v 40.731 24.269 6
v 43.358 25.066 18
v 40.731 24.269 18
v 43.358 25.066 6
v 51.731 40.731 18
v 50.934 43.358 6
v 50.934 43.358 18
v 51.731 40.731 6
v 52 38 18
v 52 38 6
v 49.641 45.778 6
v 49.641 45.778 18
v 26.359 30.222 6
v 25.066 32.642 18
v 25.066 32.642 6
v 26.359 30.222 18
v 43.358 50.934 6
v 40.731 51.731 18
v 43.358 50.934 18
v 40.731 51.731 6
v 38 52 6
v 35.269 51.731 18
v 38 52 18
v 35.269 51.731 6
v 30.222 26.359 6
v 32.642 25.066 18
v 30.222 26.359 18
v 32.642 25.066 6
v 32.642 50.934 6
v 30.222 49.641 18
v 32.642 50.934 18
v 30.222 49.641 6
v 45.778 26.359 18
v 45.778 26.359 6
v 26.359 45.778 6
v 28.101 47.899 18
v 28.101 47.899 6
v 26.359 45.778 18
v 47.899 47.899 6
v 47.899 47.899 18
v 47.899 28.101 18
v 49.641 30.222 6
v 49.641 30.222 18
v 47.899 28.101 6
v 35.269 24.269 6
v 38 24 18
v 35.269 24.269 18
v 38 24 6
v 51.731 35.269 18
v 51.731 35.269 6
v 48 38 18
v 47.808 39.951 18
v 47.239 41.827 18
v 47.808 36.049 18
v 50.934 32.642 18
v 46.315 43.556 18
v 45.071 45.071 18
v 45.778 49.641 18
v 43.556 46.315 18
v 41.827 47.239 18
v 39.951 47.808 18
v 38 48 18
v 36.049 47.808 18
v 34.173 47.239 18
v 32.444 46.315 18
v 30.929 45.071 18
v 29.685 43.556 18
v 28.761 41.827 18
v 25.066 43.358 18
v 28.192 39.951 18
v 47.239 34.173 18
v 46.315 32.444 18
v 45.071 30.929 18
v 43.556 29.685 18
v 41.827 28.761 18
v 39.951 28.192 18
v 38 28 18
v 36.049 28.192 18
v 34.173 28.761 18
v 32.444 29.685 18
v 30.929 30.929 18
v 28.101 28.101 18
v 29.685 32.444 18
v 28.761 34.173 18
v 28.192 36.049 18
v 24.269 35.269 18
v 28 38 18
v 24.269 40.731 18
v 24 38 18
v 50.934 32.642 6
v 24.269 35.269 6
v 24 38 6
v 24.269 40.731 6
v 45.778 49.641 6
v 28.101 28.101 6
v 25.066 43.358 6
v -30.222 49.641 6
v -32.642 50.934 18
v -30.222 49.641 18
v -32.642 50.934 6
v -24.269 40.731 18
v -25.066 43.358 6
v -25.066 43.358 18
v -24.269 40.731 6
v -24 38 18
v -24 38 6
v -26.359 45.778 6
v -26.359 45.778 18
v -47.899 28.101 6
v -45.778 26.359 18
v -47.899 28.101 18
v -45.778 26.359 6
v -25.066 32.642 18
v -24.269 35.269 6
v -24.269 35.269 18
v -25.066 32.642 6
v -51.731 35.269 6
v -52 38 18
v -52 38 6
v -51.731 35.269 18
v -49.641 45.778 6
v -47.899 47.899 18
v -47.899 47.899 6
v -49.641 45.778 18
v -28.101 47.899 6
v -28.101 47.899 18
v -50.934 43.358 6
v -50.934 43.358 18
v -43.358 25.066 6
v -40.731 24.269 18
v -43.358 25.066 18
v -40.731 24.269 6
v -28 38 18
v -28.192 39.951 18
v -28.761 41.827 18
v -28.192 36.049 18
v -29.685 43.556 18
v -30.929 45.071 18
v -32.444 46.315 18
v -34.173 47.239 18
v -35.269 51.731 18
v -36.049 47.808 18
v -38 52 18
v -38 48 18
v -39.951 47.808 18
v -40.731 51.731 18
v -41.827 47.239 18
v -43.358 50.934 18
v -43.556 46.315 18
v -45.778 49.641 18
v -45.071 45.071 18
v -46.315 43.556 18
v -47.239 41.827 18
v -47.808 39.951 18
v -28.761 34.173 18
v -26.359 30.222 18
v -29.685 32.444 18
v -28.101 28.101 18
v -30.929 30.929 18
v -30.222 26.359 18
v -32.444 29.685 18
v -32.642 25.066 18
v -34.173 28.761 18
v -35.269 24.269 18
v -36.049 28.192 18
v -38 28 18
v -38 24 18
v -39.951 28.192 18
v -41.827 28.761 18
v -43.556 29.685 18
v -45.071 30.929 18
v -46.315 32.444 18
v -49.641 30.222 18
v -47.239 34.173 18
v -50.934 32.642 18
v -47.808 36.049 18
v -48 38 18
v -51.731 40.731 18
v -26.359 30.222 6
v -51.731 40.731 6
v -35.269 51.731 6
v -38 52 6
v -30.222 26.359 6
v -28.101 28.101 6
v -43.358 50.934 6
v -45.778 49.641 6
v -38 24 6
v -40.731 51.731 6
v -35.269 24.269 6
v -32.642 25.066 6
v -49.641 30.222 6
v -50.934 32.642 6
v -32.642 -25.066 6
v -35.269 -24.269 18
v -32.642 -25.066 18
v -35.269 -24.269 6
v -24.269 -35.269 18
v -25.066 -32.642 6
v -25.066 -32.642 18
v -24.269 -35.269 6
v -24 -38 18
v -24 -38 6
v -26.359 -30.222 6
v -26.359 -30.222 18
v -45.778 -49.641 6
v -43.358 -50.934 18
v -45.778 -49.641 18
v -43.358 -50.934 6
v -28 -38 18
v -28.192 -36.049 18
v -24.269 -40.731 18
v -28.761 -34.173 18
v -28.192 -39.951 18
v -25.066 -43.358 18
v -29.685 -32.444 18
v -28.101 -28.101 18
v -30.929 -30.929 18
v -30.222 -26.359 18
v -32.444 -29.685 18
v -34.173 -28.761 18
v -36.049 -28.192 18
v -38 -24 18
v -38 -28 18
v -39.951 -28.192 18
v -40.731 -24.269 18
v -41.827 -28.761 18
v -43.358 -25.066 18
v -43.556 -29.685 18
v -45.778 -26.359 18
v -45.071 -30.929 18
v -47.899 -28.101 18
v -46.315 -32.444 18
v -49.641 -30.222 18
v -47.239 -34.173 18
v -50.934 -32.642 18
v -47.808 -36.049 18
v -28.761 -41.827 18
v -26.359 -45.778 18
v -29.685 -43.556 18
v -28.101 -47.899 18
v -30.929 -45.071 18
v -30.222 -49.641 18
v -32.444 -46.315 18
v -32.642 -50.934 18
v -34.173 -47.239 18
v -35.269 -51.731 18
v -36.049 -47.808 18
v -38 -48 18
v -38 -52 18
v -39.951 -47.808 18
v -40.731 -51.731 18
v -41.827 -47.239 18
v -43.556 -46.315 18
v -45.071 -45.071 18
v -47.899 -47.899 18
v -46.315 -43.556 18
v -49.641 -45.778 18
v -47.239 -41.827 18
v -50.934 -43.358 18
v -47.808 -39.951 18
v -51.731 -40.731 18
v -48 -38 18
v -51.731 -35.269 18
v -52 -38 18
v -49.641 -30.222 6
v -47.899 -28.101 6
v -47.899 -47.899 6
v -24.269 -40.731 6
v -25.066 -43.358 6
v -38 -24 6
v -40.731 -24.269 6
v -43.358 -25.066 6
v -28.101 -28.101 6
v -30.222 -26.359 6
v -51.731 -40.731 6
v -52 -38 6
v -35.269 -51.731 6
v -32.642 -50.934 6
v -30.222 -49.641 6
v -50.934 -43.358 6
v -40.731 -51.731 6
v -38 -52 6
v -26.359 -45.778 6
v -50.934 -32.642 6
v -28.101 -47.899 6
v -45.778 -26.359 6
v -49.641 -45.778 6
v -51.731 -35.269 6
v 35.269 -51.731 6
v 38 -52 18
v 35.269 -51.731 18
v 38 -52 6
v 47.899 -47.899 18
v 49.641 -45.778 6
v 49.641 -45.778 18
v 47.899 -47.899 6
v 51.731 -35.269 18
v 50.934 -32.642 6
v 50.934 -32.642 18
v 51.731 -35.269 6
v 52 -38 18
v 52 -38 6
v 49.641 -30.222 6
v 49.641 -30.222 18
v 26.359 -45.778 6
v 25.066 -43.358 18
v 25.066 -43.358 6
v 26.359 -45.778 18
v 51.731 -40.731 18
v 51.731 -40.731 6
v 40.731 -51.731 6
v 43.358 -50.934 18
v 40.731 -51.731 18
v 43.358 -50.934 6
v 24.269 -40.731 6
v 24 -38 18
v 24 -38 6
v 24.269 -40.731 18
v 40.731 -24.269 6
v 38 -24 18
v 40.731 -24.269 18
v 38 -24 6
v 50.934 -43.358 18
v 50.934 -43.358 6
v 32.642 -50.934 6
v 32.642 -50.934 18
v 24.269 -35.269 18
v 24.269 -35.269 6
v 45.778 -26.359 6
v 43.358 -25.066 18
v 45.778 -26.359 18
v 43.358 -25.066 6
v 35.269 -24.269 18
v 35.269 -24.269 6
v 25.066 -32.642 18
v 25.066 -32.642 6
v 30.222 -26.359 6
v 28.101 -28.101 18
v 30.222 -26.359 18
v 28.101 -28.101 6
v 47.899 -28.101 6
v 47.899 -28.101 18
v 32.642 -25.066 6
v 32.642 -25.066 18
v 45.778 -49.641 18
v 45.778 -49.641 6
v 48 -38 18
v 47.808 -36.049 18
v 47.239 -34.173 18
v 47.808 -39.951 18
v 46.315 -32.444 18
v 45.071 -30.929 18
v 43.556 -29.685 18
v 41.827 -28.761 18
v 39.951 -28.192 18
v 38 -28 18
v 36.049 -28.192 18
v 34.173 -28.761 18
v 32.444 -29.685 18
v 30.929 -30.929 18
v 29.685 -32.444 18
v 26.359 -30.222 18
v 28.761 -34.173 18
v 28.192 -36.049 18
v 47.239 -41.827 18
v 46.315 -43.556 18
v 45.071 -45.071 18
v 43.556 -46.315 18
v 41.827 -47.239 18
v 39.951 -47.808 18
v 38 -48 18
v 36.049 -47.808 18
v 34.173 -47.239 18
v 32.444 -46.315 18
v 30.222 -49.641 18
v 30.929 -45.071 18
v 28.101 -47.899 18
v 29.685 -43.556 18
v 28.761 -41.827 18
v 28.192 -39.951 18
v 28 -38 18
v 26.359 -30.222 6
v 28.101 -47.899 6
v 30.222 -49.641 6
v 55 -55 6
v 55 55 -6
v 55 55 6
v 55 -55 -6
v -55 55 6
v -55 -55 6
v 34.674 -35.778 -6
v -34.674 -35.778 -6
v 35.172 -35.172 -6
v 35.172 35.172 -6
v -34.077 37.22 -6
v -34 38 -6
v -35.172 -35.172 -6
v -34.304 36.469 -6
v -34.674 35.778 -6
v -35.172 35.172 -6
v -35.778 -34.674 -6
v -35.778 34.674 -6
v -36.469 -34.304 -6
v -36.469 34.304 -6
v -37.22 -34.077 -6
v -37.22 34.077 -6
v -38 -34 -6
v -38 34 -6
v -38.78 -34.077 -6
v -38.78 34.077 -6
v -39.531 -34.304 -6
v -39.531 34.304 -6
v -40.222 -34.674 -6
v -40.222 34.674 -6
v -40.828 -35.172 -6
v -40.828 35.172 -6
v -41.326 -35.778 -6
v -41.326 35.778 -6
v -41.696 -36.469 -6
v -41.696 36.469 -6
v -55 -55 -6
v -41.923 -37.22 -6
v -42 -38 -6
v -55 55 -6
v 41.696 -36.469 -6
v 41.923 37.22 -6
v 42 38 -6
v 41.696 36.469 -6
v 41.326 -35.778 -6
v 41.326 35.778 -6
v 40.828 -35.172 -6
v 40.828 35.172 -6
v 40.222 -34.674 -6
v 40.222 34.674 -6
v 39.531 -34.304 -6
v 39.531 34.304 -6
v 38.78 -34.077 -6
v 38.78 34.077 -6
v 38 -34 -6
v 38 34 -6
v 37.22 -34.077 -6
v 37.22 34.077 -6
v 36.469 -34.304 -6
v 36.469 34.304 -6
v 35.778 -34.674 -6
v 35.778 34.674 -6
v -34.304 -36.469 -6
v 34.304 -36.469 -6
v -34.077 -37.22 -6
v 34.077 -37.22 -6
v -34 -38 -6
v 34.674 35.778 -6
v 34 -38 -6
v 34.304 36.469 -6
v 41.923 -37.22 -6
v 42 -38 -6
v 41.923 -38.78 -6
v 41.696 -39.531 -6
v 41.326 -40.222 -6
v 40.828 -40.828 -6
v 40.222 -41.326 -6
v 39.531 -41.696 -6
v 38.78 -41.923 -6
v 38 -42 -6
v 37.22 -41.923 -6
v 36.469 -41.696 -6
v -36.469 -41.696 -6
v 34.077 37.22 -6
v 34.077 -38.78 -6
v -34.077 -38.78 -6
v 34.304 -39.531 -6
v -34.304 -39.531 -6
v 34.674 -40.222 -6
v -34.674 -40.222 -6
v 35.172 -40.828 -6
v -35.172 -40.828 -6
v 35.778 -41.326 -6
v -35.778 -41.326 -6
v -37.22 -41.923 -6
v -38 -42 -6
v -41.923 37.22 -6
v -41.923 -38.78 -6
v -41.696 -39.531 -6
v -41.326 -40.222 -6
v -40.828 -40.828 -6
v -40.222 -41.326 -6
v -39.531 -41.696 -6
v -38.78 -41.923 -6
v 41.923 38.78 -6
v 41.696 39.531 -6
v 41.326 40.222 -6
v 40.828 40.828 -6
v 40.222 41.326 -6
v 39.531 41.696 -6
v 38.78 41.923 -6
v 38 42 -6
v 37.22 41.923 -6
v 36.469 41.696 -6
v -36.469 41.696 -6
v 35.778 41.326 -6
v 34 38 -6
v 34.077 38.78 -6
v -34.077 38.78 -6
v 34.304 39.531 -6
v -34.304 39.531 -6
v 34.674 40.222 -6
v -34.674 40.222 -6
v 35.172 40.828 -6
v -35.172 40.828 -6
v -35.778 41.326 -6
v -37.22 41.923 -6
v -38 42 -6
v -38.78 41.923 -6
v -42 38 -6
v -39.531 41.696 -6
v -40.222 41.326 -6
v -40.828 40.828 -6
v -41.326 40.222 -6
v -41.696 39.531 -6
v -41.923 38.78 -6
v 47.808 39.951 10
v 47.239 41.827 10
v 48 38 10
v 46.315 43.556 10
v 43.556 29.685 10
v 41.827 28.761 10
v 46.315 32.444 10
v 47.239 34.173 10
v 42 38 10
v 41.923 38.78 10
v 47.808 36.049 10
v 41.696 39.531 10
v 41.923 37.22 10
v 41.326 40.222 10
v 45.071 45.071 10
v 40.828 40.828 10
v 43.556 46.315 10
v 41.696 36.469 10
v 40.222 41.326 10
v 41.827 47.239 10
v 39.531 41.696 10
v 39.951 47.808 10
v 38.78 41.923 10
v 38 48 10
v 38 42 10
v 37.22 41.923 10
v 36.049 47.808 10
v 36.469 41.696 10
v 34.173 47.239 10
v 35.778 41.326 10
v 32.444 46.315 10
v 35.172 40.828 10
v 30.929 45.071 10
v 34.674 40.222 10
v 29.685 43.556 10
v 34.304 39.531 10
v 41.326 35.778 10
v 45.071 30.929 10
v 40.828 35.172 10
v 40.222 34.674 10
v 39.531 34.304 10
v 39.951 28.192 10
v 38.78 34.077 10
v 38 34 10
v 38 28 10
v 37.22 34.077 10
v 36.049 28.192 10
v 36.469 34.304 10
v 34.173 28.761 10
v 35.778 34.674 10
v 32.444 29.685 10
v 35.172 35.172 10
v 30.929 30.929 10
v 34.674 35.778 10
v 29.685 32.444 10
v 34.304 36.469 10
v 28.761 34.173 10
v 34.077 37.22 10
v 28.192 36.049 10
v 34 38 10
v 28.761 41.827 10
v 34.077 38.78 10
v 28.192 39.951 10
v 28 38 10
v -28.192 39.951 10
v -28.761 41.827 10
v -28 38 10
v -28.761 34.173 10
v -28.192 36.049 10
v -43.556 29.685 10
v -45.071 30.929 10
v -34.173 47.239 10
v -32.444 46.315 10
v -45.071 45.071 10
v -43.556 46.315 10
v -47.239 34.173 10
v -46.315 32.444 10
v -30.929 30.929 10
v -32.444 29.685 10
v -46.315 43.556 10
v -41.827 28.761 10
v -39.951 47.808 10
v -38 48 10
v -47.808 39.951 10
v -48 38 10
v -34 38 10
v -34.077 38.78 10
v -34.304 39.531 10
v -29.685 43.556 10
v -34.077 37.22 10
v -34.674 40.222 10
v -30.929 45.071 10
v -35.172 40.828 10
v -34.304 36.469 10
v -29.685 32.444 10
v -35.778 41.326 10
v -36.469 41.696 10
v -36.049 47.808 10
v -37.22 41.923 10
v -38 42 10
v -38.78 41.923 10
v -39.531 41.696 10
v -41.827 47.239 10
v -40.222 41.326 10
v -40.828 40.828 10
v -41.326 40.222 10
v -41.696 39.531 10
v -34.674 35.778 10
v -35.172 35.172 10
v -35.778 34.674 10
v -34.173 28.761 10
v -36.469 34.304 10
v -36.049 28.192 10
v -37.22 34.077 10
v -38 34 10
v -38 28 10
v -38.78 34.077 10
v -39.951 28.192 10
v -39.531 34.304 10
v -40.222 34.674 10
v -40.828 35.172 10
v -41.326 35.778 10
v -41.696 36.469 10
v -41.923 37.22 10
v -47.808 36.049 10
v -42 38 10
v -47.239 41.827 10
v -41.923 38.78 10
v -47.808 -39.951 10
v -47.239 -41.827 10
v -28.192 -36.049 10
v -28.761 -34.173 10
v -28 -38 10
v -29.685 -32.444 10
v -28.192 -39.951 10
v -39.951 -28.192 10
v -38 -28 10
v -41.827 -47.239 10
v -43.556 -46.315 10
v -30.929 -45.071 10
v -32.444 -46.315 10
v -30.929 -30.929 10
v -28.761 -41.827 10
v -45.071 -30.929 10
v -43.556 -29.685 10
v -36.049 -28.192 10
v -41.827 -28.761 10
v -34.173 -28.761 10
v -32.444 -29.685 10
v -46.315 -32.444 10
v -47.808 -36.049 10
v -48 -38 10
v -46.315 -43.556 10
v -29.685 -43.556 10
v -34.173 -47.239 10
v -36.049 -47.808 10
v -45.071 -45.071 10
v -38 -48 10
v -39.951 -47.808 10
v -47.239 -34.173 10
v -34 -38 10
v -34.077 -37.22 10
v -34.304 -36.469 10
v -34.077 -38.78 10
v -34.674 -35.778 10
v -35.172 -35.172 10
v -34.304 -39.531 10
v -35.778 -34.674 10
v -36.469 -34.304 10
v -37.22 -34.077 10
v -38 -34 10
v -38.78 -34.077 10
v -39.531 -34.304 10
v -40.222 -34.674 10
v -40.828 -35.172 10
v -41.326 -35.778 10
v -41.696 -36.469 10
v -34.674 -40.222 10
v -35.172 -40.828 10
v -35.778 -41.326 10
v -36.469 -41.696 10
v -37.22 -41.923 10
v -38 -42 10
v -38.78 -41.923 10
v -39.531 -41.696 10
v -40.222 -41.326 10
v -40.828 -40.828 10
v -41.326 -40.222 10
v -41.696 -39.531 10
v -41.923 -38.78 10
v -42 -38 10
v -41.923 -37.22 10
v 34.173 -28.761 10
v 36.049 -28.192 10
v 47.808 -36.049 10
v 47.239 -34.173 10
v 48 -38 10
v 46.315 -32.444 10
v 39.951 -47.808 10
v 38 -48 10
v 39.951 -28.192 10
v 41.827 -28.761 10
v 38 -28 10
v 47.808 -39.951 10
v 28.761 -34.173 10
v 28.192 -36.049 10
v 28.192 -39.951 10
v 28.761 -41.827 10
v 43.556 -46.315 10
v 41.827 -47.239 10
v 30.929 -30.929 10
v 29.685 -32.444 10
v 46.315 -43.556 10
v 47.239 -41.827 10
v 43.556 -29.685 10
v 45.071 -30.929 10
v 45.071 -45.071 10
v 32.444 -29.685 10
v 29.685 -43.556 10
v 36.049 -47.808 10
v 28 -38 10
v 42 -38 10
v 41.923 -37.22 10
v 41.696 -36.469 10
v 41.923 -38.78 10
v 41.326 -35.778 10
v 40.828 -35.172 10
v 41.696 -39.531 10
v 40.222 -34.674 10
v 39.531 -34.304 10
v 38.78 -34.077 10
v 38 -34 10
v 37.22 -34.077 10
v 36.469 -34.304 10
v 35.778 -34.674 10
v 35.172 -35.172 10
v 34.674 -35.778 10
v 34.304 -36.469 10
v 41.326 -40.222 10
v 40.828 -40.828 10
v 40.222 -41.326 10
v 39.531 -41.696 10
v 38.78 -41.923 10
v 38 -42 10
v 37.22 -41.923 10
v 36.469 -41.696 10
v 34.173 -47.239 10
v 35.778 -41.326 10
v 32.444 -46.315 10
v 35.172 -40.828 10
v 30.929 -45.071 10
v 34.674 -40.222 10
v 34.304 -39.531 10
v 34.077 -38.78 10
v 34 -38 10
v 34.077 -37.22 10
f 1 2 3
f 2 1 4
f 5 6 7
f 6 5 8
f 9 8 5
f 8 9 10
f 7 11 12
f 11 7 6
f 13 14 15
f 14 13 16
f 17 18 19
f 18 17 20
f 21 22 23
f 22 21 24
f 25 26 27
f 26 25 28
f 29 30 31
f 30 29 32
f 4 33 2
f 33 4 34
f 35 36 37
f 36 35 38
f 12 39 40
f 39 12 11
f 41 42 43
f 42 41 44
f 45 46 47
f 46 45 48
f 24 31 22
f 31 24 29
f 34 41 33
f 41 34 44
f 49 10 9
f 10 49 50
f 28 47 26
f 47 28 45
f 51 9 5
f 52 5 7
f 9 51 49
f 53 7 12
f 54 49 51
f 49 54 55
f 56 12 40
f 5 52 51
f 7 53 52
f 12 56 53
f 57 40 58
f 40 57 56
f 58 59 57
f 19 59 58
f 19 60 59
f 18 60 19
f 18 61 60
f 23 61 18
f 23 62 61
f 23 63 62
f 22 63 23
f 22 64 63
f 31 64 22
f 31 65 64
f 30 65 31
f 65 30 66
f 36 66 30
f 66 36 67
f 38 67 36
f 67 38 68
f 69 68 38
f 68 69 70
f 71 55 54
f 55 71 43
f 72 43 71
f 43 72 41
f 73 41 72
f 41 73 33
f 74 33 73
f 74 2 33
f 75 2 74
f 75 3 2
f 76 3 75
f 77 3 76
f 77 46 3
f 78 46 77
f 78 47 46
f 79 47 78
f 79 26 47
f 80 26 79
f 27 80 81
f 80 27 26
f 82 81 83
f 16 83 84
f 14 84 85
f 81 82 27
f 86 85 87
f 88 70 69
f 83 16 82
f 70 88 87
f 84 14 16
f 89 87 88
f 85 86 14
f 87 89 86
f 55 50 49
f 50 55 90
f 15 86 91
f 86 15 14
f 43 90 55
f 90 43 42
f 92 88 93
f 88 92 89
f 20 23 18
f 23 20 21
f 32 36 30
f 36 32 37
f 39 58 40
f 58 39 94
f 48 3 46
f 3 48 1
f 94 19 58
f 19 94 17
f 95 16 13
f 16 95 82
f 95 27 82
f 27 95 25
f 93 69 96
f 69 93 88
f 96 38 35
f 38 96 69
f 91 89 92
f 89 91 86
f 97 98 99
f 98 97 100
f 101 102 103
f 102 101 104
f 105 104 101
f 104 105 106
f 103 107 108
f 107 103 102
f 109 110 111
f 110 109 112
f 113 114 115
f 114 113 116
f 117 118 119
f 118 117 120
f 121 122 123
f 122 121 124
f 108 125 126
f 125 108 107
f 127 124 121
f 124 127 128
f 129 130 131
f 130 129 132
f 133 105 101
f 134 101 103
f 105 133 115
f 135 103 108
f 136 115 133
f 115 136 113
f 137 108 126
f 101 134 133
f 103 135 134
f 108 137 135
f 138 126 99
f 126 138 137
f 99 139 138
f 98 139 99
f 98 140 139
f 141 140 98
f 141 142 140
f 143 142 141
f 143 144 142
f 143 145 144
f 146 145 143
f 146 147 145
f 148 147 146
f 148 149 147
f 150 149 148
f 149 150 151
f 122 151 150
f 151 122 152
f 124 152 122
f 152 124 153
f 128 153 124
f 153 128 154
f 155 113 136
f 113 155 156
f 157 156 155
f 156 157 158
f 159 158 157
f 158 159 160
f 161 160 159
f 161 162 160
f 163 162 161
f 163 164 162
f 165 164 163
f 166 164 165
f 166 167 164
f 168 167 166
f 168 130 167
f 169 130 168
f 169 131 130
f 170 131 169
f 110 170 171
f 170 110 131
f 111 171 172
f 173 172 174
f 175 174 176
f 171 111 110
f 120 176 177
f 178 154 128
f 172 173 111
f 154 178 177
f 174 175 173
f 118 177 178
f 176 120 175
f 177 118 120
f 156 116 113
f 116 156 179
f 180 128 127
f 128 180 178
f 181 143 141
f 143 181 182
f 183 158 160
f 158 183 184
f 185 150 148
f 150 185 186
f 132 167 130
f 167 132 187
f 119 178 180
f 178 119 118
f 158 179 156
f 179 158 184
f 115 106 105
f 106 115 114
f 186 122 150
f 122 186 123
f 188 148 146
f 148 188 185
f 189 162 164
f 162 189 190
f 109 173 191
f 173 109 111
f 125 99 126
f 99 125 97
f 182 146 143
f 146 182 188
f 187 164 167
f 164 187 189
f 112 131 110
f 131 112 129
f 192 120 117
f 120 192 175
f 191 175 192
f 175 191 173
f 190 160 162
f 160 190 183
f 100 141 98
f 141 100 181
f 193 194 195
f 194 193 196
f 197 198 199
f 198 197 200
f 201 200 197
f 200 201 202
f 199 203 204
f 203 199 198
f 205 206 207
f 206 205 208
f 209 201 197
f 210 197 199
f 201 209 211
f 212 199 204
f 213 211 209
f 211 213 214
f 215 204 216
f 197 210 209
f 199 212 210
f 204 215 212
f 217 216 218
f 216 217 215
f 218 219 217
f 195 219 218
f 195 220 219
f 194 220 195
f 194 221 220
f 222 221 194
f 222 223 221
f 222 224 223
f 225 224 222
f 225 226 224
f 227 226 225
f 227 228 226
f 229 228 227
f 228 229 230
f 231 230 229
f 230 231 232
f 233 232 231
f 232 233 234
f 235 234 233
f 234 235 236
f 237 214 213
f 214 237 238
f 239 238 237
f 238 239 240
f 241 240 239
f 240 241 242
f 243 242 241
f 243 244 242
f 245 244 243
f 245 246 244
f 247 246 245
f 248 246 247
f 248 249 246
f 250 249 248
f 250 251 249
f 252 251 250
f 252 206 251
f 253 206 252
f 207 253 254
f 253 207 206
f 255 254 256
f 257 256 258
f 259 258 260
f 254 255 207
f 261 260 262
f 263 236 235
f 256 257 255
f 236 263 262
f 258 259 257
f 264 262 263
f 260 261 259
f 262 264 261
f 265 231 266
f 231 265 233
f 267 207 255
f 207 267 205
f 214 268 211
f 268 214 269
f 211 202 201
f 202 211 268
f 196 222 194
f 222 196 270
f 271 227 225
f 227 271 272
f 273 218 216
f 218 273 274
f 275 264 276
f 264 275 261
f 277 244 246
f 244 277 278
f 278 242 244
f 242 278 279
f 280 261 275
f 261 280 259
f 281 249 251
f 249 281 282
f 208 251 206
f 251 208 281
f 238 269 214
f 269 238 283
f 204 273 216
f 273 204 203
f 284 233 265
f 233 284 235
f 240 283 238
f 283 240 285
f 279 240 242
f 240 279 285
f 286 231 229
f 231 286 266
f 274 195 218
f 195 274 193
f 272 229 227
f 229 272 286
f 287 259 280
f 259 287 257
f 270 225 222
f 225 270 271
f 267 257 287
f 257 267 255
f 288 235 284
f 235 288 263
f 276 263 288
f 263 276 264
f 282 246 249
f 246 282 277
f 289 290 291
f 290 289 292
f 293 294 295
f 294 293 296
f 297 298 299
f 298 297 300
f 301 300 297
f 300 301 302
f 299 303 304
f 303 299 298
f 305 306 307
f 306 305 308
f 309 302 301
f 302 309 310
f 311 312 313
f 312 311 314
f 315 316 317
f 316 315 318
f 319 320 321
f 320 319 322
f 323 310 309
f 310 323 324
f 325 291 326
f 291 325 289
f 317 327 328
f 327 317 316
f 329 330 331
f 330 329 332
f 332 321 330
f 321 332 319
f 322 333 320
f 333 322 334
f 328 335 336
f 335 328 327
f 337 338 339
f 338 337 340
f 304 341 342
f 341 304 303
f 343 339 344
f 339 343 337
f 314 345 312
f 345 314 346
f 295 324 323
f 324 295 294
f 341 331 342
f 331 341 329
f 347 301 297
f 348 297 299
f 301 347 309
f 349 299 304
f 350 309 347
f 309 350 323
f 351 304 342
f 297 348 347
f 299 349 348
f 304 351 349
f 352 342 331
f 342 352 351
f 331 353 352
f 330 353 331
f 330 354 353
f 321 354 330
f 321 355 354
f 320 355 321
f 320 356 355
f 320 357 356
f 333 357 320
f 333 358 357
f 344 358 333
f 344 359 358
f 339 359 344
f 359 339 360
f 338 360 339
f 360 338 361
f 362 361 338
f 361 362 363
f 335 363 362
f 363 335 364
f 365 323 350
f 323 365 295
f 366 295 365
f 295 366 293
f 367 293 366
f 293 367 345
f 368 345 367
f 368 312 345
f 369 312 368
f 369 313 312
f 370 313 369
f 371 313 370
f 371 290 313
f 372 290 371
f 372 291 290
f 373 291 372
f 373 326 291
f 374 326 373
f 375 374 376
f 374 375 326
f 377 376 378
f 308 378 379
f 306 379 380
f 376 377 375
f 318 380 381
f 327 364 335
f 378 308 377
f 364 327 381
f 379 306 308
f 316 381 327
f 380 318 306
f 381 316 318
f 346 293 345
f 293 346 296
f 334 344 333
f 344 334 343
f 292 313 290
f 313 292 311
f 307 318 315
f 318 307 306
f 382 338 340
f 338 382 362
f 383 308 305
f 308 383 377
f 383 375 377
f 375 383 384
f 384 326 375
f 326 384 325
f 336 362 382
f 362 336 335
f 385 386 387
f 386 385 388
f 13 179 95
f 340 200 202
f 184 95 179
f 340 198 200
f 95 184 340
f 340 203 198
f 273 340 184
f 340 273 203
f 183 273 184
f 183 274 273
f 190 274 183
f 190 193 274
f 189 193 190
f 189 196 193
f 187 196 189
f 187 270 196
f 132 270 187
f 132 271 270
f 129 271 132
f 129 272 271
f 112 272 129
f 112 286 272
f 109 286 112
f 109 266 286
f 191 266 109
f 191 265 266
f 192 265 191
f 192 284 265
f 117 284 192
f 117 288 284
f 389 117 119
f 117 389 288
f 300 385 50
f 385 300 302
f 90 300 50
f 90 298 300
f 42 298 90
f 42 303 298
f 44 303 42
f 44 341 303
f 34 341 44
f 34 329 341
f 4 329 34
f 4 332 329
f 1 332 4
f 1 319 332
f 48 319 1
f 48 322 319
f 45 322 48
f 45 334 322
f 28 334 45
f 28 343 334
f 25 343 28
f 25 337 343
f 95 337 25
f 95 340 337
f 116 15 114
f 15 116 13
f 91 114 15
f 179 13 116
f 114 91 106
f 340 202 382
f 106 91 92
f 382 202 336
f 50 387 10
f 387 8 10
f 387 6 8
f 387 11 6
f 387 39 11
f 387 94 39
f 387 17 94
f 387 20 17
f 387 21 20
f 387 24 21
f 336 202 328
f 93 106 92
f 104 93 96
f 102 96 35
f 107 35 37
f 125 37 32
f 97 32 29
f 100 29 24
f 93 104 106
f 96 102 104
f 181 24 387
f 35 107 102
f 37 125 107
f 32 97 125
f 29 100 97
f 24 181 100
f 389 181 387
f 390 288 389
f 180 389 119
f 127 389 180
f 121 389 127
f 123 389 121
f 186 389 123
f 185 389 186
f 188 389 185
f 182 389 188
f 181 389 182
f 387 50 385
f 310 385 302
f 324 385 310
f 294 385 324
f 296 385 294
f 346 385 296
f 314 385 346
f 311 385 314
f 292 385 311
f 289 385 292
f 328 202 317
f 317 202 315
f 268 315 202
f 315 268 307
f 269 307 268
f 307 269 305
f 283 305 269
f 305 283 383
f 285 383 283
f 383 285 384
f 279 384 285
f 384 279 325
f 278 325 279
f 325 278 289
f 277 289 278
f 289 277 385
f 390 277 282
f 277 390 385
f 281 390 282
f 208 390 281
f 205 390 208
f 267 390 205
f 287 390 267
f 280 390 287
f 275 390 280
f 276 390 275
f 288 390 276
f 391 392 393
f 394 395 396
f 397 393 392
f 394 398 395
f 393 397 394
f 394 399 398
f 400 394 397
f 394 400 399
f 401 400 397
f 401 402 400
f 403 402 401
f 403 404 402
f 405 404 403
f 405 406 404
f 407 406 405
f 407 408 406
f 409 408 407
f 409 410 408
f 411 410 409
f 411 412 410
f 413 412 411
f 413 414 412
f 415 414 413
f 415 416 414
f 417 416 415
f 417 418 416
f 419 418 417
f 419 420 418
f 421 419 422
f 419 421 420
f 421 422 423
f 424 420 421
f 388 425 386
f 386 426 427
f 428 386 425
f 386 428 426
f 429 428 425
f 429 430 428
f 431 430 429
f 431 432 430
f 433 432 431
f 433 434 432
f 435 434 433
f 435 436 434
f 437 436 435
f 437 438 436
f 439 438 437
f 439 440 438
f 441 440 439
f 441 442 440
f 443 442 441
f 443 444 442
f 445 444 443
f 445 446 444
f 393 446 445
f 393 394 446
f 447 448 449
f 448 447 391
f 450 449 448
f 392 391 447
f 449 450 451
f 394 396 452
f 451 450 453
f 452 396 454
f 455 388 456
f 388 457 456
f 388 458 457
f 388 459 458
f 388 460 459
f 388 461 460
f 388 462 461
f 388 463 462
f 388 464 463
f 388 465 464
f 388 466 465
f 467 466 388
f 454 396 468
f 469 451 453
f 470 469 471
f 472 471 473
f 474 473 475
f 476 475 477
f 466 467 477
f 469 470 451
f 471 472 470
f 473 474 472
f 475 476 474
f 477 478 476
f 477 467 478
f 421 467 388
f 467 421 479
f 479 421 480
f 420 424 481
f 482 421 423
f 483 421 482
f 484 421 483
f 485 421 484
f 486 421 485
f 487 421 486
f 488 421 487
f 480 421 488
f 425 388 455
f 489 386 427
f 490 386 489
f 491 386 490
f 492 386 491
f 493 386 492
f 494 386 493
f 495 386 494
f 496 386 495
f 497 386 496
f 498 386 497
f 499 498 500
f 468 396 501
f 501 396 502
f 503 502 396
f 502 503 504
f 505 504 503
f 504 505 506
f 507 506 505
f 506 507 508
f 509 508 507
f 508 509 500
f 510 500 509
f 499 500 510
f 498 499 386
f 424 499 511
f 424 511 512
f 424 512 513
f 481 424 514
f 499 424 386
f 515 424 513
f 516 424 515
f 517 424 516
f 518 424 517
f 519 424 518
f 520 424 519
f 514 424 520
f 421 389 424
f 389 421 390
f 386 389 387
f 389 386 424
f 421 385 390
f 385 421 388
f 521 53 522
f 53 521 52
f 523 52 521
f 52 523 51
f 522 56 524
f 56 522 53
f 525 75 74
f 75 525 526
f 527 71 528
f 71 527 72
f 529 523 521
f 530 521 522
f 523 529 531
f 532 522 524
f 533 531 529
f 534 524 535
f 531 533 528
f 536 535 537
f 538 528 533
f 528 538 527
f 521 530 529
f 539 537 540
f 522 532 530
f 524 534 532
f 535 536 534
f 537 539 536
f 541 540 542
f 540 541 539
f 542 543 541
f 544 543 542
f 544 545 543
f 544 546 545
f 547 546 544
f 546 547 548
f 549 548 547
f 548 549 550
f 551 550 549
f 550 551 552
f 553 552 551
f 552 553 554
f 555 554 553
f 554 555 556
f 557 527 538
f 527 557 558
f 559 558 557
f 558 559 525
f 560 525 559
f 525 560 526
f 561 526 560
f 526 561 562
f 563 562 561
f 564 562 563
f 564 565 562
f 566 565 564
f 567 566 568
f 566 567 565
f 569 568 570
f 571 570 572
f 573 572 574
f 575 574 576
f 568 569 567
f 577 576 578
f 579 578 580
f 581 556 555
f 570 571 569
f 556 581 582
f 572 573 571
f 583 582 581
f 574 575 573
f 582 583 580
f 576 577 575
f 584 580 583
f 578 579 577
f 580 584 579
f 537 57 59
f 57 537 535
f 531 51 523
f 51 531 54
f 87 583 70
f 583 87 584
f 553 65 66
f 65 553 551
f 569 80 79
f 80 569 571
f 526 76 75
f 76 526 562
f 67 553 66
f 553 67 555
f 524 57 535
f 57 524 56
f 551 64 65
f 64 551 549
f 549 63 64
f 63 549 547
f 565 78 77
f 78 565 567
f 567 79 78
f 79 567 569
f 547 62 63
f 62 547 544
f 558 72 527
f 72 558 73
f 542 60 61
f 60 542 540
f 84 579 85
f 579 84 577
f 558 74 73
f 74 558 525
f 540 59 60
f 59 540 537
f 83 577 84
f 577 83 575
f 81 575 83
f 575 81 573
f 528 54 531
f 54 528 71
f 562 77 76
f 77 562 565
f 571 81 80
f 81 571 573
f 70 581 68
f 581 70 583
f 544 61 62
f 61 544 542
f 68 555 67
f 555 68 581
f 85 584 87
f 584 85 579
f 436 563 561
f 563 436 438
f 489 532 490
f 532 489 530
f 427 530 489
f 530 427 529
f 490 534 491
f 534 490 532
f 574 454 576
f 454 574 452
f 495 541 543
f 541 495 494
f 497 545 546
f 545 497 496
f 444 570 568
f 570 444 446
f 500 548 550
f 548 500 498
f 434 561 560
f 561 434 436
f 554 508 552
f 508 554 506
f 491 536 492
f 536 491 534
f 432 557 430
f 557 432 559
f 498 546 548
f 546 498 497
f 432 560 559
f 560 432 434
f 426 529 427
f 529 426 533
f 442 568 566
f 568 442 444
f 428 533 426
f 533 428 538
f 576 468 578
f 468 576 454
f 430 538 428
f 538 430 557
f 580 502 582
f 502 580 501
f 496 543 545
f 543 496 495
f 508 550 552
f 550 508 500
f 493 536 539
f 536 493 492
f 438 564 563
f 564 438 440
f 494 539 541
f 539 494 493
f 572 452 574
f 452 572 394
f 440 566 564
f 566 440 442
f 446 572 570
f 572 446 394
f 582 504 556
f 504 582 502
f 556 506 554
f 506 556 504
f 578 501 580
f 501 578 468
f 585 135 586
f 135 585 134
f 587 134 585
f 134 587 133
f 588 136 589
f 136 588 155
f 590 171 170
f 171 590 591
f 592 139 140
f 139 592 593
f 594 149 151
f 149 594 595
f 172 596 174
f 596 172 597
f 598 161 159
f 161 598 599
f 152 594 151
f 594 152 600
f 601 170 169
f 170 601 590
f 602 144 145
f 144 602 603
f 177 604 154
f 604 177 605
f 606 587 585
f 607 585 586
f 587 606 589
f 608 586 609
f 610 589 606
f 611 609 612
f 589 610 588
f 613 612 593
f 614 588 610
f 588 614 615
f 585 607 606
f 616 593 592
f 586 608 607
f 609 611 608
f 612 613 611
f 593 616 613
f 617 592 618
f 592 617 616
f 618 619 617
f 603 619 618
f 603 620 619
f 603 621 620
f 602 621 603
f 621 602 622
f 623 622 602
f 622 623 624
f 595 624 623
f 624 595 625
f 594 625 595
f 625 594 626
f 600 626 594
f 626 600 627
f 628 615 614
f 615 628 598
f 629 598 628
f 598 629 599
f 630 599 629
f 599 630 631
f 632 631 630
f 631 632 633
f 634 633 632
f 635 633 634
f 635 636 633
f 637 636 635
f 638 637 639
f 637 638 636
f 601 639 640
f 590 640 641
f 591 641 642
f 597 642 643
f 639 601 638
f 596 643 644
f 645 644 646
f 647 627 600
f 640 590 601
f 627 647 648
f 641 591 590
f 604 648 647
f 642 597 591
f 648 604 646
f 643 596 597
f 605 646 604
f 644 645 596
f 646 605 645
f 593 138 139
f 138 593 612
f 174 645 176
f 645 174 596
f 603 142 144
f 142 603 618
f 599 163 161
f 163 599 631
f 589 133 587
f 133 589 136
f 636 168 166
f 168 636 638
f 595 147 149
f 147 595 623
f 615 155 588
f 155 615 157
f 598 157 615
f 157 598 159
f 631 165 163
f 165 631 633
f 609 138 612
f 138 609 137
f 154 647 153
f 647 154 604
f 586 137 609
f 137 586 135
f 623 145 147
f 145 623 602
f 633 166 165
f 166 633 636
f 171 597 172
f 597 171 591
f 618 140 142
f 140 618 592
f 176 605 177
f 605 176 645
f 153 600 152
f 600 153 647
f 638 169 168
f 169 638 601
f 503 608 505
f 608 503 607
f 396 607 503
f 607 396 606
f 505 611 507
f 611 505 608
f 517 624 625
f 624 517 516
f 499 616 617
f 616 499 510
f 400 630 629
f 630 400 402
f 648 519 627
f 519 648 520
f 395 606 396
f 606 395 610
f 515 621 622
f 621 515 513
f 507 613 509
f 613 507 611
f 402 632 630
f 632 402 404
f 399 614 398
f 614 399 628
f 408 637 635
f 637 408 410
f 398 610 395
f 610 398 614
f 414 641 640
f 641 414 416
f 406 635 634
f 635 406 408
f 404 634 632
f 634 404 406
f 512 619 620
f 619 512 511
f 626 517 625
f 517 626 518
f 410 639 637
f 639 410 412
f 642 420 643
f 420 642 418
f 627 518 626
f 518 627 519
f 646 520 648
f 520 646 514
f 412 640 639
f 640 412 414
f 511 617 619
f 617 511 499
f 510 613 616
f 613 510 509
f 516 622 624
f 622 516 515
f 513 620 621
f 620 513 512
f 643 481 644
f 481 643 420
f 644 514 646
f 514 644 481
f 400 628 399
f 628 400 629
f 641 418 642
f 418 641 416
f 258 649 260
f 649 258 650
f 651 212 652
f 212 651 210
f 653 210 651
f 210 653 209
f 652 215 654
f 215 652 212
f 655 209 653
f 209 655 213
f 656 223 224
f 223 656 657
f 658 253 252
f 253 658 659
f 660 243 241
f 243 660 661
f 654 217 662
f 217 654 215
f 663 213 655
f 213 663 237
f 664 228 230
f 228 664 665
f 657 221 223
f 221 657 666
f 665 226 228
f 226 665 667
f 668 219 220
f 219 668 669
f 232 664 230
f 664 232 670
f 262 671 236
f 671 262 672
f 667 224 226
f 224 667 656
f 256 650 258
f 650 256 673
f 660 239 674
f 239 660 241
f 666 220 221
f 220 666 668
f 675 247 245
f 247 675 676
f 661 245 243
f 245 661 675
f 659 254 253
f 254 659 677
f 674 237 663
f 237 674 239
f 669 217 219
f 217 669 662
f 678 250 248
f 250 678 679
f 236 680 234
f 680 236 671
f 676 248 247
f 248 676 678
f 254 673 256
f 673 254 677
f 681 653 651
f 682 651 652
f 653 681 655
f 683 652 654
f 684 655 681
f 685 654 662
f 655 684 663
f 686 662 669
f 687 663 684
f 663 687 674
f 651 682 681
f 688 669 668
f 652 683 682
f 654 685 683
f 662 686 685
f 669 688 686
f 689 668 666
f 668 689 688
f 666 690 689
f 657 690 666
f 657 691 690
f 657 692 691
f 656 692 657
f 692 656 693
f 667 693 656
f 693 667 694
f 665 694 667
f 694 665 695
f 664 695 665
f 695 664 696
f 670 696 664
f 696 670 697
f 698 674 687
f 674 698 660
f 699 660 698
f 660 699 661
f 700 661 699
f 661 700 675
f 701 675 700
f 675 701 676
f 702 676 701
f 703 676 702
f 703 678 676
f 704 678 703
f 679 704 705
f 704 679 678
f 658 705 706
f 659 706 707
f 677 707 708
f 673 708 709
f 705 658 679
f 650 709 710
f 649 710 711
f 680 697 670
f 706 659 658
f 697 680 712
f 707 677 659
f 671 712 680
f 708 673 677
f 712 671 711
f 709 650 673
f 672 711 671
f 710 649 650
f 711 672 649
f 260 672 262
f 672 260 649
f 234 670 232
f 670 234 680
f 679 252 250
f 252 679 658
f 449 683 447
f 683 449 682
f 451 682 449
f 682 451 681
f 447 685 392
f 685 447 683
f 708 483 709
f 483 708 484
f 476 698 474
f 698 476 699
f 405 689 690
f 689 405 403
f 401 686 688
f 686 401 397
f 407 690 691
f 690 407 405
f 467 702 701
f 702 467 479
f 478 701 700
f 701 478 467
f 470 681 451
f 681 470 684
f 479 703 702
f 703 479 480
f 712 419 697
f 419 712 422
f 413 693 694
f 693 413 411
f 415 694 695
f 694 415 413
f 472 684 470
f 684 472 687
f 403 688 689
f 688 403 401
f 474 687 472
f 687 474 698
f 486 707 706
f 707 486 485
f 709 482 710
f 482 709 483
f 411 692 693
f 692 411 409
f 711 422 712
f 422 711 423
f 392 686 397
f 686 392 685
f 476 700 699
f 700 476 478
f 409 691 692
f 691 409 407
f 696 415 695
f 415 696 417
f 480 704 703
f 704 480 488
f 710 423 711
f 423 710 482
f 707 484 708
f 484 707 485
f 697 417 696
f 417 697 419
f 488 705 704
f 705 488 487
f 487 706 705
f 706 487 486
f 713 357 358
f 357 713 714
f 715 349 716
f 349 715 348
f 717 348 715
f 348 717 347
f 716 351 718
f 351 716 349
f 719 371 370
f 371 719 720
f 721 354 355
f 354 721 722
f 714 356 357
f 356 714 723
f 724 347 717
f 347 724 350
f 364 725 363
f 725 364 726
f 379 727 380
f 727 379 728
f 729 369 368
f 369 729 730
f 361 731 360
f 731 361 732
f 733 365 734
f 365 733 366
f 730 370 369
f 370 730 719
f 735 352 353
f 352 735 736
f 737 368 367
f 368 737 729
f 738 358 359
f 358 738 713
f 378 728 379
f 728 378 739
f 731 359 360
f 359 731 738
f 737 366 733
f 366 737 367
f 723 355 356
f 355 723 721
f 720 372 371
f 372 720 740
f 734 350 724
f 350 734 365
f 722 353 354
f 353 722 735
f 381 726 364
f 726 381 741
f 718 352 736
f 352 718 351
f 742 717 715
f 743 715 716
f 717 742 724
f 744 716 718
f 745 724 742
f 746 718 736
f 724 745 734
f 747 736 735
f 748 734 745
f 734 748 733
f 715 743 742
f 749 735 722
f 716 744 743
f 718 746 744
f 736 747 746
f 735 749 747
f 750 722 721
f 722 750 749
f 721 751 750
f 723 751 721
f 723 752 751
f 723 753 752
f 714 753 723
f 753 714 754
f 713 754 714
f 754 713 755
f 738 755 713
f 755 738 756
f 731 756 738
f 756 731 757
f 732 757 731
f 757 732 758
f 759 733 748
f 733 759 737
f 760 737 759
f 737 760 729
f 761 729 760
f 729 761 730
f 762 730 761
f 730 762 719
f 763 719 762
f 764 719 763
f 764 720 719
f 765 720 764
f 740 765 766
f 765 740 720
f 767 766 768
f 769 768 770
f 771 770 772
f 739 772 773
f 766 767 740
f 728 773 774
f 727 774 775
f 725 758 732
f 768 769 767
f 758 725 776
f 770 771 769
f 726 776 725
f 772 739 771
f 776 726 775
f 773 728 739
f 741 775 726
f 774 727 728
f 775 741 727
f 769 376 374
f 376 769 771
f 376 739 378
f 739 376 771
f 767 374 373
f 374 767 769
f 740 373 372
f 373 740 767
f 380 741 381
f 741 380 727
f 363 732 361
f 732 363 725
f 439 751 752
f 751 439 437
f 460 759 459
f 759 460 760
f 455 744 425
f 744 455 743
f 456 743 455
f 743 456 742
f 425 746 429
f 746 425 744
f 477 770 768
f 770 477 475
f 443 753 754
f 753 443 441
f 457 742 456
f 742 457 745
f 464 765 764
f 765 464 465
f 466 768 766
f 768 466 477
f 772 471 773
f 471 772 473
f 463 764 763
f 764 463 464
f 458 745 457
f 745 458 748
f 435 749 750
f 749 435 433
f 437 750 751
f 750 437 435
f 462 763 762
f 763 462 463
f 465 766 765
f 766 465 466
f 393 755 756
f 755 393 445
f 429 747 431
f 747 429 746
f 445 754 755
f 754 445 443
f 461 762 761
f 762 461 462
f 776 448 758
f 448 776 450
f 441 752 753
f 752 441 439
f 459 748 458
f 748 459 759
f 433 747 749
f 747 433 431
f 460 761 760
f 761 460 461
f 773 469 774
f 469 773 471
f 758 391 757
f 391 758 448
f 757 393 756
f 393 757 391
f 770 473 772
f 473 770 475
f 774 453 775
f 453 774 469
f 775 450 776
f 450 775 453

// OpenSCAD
$fn = 32;

// ----------------------------------------------------------------------
// Socket pad plate
// bosses with counterbored sockets for the screws
// ----------------------------------------------------------------------

// --- parameters (mm) ---
base_t = 12;             // base plate thickness
boss_h = 12;             // boss height above the base plate
boss_d = 28;             // boss diameter
socket_d = 20;           // socket diameter
socket_depth = 8;        // socket depth from the boss face
bolt_d = 8;              // screw clearance hole through the socket floor
plate = [110, 110, 12];  // overall size (x, y, z)
edge = 17;               // boss centre offset from the plate edge
pads = 4;                // boss count, one per corner

// --- derived feature positions (mm) ---
height = base_t + boss_h;        // = 24   overall height of the part
corner_x = plate[0] / 2 - edge;  // = 38   boss centre X
corner_y = plate[1] / 2 - edge;  // = 38   boss centre Y
feature_centers = [
  [corner_x, corner_y],
  [-corner_x, corner_y],
  [-corner_x, -corner_y],
  [corner_x, -corner_y]
];   // boss centres: sockets, holes and the pads themselves are placed from here

// base plate, bosses on feature_centers, socket + through hole in each
difference() {
  union() {
    cube(plate, center = true);
    for (centre = feature_centers)
      translate([centre[0], centre[1], plate[2] / 2 - 1])
        cylinder(d = boss_d, h = boss_h + 1);
  }
  for (centre = feature_centers) {
    translate([centre[0], centre[1], plate[2] / 2 + boss_h - socket_depth])
      cylinder(d = socket_d, h = socket_depth + 1);
    translate([centre[0], centre[1], -height])
      cylinder(d = bolt_d, h = 2 * height + 2);  // through the socket floor
  }
}
